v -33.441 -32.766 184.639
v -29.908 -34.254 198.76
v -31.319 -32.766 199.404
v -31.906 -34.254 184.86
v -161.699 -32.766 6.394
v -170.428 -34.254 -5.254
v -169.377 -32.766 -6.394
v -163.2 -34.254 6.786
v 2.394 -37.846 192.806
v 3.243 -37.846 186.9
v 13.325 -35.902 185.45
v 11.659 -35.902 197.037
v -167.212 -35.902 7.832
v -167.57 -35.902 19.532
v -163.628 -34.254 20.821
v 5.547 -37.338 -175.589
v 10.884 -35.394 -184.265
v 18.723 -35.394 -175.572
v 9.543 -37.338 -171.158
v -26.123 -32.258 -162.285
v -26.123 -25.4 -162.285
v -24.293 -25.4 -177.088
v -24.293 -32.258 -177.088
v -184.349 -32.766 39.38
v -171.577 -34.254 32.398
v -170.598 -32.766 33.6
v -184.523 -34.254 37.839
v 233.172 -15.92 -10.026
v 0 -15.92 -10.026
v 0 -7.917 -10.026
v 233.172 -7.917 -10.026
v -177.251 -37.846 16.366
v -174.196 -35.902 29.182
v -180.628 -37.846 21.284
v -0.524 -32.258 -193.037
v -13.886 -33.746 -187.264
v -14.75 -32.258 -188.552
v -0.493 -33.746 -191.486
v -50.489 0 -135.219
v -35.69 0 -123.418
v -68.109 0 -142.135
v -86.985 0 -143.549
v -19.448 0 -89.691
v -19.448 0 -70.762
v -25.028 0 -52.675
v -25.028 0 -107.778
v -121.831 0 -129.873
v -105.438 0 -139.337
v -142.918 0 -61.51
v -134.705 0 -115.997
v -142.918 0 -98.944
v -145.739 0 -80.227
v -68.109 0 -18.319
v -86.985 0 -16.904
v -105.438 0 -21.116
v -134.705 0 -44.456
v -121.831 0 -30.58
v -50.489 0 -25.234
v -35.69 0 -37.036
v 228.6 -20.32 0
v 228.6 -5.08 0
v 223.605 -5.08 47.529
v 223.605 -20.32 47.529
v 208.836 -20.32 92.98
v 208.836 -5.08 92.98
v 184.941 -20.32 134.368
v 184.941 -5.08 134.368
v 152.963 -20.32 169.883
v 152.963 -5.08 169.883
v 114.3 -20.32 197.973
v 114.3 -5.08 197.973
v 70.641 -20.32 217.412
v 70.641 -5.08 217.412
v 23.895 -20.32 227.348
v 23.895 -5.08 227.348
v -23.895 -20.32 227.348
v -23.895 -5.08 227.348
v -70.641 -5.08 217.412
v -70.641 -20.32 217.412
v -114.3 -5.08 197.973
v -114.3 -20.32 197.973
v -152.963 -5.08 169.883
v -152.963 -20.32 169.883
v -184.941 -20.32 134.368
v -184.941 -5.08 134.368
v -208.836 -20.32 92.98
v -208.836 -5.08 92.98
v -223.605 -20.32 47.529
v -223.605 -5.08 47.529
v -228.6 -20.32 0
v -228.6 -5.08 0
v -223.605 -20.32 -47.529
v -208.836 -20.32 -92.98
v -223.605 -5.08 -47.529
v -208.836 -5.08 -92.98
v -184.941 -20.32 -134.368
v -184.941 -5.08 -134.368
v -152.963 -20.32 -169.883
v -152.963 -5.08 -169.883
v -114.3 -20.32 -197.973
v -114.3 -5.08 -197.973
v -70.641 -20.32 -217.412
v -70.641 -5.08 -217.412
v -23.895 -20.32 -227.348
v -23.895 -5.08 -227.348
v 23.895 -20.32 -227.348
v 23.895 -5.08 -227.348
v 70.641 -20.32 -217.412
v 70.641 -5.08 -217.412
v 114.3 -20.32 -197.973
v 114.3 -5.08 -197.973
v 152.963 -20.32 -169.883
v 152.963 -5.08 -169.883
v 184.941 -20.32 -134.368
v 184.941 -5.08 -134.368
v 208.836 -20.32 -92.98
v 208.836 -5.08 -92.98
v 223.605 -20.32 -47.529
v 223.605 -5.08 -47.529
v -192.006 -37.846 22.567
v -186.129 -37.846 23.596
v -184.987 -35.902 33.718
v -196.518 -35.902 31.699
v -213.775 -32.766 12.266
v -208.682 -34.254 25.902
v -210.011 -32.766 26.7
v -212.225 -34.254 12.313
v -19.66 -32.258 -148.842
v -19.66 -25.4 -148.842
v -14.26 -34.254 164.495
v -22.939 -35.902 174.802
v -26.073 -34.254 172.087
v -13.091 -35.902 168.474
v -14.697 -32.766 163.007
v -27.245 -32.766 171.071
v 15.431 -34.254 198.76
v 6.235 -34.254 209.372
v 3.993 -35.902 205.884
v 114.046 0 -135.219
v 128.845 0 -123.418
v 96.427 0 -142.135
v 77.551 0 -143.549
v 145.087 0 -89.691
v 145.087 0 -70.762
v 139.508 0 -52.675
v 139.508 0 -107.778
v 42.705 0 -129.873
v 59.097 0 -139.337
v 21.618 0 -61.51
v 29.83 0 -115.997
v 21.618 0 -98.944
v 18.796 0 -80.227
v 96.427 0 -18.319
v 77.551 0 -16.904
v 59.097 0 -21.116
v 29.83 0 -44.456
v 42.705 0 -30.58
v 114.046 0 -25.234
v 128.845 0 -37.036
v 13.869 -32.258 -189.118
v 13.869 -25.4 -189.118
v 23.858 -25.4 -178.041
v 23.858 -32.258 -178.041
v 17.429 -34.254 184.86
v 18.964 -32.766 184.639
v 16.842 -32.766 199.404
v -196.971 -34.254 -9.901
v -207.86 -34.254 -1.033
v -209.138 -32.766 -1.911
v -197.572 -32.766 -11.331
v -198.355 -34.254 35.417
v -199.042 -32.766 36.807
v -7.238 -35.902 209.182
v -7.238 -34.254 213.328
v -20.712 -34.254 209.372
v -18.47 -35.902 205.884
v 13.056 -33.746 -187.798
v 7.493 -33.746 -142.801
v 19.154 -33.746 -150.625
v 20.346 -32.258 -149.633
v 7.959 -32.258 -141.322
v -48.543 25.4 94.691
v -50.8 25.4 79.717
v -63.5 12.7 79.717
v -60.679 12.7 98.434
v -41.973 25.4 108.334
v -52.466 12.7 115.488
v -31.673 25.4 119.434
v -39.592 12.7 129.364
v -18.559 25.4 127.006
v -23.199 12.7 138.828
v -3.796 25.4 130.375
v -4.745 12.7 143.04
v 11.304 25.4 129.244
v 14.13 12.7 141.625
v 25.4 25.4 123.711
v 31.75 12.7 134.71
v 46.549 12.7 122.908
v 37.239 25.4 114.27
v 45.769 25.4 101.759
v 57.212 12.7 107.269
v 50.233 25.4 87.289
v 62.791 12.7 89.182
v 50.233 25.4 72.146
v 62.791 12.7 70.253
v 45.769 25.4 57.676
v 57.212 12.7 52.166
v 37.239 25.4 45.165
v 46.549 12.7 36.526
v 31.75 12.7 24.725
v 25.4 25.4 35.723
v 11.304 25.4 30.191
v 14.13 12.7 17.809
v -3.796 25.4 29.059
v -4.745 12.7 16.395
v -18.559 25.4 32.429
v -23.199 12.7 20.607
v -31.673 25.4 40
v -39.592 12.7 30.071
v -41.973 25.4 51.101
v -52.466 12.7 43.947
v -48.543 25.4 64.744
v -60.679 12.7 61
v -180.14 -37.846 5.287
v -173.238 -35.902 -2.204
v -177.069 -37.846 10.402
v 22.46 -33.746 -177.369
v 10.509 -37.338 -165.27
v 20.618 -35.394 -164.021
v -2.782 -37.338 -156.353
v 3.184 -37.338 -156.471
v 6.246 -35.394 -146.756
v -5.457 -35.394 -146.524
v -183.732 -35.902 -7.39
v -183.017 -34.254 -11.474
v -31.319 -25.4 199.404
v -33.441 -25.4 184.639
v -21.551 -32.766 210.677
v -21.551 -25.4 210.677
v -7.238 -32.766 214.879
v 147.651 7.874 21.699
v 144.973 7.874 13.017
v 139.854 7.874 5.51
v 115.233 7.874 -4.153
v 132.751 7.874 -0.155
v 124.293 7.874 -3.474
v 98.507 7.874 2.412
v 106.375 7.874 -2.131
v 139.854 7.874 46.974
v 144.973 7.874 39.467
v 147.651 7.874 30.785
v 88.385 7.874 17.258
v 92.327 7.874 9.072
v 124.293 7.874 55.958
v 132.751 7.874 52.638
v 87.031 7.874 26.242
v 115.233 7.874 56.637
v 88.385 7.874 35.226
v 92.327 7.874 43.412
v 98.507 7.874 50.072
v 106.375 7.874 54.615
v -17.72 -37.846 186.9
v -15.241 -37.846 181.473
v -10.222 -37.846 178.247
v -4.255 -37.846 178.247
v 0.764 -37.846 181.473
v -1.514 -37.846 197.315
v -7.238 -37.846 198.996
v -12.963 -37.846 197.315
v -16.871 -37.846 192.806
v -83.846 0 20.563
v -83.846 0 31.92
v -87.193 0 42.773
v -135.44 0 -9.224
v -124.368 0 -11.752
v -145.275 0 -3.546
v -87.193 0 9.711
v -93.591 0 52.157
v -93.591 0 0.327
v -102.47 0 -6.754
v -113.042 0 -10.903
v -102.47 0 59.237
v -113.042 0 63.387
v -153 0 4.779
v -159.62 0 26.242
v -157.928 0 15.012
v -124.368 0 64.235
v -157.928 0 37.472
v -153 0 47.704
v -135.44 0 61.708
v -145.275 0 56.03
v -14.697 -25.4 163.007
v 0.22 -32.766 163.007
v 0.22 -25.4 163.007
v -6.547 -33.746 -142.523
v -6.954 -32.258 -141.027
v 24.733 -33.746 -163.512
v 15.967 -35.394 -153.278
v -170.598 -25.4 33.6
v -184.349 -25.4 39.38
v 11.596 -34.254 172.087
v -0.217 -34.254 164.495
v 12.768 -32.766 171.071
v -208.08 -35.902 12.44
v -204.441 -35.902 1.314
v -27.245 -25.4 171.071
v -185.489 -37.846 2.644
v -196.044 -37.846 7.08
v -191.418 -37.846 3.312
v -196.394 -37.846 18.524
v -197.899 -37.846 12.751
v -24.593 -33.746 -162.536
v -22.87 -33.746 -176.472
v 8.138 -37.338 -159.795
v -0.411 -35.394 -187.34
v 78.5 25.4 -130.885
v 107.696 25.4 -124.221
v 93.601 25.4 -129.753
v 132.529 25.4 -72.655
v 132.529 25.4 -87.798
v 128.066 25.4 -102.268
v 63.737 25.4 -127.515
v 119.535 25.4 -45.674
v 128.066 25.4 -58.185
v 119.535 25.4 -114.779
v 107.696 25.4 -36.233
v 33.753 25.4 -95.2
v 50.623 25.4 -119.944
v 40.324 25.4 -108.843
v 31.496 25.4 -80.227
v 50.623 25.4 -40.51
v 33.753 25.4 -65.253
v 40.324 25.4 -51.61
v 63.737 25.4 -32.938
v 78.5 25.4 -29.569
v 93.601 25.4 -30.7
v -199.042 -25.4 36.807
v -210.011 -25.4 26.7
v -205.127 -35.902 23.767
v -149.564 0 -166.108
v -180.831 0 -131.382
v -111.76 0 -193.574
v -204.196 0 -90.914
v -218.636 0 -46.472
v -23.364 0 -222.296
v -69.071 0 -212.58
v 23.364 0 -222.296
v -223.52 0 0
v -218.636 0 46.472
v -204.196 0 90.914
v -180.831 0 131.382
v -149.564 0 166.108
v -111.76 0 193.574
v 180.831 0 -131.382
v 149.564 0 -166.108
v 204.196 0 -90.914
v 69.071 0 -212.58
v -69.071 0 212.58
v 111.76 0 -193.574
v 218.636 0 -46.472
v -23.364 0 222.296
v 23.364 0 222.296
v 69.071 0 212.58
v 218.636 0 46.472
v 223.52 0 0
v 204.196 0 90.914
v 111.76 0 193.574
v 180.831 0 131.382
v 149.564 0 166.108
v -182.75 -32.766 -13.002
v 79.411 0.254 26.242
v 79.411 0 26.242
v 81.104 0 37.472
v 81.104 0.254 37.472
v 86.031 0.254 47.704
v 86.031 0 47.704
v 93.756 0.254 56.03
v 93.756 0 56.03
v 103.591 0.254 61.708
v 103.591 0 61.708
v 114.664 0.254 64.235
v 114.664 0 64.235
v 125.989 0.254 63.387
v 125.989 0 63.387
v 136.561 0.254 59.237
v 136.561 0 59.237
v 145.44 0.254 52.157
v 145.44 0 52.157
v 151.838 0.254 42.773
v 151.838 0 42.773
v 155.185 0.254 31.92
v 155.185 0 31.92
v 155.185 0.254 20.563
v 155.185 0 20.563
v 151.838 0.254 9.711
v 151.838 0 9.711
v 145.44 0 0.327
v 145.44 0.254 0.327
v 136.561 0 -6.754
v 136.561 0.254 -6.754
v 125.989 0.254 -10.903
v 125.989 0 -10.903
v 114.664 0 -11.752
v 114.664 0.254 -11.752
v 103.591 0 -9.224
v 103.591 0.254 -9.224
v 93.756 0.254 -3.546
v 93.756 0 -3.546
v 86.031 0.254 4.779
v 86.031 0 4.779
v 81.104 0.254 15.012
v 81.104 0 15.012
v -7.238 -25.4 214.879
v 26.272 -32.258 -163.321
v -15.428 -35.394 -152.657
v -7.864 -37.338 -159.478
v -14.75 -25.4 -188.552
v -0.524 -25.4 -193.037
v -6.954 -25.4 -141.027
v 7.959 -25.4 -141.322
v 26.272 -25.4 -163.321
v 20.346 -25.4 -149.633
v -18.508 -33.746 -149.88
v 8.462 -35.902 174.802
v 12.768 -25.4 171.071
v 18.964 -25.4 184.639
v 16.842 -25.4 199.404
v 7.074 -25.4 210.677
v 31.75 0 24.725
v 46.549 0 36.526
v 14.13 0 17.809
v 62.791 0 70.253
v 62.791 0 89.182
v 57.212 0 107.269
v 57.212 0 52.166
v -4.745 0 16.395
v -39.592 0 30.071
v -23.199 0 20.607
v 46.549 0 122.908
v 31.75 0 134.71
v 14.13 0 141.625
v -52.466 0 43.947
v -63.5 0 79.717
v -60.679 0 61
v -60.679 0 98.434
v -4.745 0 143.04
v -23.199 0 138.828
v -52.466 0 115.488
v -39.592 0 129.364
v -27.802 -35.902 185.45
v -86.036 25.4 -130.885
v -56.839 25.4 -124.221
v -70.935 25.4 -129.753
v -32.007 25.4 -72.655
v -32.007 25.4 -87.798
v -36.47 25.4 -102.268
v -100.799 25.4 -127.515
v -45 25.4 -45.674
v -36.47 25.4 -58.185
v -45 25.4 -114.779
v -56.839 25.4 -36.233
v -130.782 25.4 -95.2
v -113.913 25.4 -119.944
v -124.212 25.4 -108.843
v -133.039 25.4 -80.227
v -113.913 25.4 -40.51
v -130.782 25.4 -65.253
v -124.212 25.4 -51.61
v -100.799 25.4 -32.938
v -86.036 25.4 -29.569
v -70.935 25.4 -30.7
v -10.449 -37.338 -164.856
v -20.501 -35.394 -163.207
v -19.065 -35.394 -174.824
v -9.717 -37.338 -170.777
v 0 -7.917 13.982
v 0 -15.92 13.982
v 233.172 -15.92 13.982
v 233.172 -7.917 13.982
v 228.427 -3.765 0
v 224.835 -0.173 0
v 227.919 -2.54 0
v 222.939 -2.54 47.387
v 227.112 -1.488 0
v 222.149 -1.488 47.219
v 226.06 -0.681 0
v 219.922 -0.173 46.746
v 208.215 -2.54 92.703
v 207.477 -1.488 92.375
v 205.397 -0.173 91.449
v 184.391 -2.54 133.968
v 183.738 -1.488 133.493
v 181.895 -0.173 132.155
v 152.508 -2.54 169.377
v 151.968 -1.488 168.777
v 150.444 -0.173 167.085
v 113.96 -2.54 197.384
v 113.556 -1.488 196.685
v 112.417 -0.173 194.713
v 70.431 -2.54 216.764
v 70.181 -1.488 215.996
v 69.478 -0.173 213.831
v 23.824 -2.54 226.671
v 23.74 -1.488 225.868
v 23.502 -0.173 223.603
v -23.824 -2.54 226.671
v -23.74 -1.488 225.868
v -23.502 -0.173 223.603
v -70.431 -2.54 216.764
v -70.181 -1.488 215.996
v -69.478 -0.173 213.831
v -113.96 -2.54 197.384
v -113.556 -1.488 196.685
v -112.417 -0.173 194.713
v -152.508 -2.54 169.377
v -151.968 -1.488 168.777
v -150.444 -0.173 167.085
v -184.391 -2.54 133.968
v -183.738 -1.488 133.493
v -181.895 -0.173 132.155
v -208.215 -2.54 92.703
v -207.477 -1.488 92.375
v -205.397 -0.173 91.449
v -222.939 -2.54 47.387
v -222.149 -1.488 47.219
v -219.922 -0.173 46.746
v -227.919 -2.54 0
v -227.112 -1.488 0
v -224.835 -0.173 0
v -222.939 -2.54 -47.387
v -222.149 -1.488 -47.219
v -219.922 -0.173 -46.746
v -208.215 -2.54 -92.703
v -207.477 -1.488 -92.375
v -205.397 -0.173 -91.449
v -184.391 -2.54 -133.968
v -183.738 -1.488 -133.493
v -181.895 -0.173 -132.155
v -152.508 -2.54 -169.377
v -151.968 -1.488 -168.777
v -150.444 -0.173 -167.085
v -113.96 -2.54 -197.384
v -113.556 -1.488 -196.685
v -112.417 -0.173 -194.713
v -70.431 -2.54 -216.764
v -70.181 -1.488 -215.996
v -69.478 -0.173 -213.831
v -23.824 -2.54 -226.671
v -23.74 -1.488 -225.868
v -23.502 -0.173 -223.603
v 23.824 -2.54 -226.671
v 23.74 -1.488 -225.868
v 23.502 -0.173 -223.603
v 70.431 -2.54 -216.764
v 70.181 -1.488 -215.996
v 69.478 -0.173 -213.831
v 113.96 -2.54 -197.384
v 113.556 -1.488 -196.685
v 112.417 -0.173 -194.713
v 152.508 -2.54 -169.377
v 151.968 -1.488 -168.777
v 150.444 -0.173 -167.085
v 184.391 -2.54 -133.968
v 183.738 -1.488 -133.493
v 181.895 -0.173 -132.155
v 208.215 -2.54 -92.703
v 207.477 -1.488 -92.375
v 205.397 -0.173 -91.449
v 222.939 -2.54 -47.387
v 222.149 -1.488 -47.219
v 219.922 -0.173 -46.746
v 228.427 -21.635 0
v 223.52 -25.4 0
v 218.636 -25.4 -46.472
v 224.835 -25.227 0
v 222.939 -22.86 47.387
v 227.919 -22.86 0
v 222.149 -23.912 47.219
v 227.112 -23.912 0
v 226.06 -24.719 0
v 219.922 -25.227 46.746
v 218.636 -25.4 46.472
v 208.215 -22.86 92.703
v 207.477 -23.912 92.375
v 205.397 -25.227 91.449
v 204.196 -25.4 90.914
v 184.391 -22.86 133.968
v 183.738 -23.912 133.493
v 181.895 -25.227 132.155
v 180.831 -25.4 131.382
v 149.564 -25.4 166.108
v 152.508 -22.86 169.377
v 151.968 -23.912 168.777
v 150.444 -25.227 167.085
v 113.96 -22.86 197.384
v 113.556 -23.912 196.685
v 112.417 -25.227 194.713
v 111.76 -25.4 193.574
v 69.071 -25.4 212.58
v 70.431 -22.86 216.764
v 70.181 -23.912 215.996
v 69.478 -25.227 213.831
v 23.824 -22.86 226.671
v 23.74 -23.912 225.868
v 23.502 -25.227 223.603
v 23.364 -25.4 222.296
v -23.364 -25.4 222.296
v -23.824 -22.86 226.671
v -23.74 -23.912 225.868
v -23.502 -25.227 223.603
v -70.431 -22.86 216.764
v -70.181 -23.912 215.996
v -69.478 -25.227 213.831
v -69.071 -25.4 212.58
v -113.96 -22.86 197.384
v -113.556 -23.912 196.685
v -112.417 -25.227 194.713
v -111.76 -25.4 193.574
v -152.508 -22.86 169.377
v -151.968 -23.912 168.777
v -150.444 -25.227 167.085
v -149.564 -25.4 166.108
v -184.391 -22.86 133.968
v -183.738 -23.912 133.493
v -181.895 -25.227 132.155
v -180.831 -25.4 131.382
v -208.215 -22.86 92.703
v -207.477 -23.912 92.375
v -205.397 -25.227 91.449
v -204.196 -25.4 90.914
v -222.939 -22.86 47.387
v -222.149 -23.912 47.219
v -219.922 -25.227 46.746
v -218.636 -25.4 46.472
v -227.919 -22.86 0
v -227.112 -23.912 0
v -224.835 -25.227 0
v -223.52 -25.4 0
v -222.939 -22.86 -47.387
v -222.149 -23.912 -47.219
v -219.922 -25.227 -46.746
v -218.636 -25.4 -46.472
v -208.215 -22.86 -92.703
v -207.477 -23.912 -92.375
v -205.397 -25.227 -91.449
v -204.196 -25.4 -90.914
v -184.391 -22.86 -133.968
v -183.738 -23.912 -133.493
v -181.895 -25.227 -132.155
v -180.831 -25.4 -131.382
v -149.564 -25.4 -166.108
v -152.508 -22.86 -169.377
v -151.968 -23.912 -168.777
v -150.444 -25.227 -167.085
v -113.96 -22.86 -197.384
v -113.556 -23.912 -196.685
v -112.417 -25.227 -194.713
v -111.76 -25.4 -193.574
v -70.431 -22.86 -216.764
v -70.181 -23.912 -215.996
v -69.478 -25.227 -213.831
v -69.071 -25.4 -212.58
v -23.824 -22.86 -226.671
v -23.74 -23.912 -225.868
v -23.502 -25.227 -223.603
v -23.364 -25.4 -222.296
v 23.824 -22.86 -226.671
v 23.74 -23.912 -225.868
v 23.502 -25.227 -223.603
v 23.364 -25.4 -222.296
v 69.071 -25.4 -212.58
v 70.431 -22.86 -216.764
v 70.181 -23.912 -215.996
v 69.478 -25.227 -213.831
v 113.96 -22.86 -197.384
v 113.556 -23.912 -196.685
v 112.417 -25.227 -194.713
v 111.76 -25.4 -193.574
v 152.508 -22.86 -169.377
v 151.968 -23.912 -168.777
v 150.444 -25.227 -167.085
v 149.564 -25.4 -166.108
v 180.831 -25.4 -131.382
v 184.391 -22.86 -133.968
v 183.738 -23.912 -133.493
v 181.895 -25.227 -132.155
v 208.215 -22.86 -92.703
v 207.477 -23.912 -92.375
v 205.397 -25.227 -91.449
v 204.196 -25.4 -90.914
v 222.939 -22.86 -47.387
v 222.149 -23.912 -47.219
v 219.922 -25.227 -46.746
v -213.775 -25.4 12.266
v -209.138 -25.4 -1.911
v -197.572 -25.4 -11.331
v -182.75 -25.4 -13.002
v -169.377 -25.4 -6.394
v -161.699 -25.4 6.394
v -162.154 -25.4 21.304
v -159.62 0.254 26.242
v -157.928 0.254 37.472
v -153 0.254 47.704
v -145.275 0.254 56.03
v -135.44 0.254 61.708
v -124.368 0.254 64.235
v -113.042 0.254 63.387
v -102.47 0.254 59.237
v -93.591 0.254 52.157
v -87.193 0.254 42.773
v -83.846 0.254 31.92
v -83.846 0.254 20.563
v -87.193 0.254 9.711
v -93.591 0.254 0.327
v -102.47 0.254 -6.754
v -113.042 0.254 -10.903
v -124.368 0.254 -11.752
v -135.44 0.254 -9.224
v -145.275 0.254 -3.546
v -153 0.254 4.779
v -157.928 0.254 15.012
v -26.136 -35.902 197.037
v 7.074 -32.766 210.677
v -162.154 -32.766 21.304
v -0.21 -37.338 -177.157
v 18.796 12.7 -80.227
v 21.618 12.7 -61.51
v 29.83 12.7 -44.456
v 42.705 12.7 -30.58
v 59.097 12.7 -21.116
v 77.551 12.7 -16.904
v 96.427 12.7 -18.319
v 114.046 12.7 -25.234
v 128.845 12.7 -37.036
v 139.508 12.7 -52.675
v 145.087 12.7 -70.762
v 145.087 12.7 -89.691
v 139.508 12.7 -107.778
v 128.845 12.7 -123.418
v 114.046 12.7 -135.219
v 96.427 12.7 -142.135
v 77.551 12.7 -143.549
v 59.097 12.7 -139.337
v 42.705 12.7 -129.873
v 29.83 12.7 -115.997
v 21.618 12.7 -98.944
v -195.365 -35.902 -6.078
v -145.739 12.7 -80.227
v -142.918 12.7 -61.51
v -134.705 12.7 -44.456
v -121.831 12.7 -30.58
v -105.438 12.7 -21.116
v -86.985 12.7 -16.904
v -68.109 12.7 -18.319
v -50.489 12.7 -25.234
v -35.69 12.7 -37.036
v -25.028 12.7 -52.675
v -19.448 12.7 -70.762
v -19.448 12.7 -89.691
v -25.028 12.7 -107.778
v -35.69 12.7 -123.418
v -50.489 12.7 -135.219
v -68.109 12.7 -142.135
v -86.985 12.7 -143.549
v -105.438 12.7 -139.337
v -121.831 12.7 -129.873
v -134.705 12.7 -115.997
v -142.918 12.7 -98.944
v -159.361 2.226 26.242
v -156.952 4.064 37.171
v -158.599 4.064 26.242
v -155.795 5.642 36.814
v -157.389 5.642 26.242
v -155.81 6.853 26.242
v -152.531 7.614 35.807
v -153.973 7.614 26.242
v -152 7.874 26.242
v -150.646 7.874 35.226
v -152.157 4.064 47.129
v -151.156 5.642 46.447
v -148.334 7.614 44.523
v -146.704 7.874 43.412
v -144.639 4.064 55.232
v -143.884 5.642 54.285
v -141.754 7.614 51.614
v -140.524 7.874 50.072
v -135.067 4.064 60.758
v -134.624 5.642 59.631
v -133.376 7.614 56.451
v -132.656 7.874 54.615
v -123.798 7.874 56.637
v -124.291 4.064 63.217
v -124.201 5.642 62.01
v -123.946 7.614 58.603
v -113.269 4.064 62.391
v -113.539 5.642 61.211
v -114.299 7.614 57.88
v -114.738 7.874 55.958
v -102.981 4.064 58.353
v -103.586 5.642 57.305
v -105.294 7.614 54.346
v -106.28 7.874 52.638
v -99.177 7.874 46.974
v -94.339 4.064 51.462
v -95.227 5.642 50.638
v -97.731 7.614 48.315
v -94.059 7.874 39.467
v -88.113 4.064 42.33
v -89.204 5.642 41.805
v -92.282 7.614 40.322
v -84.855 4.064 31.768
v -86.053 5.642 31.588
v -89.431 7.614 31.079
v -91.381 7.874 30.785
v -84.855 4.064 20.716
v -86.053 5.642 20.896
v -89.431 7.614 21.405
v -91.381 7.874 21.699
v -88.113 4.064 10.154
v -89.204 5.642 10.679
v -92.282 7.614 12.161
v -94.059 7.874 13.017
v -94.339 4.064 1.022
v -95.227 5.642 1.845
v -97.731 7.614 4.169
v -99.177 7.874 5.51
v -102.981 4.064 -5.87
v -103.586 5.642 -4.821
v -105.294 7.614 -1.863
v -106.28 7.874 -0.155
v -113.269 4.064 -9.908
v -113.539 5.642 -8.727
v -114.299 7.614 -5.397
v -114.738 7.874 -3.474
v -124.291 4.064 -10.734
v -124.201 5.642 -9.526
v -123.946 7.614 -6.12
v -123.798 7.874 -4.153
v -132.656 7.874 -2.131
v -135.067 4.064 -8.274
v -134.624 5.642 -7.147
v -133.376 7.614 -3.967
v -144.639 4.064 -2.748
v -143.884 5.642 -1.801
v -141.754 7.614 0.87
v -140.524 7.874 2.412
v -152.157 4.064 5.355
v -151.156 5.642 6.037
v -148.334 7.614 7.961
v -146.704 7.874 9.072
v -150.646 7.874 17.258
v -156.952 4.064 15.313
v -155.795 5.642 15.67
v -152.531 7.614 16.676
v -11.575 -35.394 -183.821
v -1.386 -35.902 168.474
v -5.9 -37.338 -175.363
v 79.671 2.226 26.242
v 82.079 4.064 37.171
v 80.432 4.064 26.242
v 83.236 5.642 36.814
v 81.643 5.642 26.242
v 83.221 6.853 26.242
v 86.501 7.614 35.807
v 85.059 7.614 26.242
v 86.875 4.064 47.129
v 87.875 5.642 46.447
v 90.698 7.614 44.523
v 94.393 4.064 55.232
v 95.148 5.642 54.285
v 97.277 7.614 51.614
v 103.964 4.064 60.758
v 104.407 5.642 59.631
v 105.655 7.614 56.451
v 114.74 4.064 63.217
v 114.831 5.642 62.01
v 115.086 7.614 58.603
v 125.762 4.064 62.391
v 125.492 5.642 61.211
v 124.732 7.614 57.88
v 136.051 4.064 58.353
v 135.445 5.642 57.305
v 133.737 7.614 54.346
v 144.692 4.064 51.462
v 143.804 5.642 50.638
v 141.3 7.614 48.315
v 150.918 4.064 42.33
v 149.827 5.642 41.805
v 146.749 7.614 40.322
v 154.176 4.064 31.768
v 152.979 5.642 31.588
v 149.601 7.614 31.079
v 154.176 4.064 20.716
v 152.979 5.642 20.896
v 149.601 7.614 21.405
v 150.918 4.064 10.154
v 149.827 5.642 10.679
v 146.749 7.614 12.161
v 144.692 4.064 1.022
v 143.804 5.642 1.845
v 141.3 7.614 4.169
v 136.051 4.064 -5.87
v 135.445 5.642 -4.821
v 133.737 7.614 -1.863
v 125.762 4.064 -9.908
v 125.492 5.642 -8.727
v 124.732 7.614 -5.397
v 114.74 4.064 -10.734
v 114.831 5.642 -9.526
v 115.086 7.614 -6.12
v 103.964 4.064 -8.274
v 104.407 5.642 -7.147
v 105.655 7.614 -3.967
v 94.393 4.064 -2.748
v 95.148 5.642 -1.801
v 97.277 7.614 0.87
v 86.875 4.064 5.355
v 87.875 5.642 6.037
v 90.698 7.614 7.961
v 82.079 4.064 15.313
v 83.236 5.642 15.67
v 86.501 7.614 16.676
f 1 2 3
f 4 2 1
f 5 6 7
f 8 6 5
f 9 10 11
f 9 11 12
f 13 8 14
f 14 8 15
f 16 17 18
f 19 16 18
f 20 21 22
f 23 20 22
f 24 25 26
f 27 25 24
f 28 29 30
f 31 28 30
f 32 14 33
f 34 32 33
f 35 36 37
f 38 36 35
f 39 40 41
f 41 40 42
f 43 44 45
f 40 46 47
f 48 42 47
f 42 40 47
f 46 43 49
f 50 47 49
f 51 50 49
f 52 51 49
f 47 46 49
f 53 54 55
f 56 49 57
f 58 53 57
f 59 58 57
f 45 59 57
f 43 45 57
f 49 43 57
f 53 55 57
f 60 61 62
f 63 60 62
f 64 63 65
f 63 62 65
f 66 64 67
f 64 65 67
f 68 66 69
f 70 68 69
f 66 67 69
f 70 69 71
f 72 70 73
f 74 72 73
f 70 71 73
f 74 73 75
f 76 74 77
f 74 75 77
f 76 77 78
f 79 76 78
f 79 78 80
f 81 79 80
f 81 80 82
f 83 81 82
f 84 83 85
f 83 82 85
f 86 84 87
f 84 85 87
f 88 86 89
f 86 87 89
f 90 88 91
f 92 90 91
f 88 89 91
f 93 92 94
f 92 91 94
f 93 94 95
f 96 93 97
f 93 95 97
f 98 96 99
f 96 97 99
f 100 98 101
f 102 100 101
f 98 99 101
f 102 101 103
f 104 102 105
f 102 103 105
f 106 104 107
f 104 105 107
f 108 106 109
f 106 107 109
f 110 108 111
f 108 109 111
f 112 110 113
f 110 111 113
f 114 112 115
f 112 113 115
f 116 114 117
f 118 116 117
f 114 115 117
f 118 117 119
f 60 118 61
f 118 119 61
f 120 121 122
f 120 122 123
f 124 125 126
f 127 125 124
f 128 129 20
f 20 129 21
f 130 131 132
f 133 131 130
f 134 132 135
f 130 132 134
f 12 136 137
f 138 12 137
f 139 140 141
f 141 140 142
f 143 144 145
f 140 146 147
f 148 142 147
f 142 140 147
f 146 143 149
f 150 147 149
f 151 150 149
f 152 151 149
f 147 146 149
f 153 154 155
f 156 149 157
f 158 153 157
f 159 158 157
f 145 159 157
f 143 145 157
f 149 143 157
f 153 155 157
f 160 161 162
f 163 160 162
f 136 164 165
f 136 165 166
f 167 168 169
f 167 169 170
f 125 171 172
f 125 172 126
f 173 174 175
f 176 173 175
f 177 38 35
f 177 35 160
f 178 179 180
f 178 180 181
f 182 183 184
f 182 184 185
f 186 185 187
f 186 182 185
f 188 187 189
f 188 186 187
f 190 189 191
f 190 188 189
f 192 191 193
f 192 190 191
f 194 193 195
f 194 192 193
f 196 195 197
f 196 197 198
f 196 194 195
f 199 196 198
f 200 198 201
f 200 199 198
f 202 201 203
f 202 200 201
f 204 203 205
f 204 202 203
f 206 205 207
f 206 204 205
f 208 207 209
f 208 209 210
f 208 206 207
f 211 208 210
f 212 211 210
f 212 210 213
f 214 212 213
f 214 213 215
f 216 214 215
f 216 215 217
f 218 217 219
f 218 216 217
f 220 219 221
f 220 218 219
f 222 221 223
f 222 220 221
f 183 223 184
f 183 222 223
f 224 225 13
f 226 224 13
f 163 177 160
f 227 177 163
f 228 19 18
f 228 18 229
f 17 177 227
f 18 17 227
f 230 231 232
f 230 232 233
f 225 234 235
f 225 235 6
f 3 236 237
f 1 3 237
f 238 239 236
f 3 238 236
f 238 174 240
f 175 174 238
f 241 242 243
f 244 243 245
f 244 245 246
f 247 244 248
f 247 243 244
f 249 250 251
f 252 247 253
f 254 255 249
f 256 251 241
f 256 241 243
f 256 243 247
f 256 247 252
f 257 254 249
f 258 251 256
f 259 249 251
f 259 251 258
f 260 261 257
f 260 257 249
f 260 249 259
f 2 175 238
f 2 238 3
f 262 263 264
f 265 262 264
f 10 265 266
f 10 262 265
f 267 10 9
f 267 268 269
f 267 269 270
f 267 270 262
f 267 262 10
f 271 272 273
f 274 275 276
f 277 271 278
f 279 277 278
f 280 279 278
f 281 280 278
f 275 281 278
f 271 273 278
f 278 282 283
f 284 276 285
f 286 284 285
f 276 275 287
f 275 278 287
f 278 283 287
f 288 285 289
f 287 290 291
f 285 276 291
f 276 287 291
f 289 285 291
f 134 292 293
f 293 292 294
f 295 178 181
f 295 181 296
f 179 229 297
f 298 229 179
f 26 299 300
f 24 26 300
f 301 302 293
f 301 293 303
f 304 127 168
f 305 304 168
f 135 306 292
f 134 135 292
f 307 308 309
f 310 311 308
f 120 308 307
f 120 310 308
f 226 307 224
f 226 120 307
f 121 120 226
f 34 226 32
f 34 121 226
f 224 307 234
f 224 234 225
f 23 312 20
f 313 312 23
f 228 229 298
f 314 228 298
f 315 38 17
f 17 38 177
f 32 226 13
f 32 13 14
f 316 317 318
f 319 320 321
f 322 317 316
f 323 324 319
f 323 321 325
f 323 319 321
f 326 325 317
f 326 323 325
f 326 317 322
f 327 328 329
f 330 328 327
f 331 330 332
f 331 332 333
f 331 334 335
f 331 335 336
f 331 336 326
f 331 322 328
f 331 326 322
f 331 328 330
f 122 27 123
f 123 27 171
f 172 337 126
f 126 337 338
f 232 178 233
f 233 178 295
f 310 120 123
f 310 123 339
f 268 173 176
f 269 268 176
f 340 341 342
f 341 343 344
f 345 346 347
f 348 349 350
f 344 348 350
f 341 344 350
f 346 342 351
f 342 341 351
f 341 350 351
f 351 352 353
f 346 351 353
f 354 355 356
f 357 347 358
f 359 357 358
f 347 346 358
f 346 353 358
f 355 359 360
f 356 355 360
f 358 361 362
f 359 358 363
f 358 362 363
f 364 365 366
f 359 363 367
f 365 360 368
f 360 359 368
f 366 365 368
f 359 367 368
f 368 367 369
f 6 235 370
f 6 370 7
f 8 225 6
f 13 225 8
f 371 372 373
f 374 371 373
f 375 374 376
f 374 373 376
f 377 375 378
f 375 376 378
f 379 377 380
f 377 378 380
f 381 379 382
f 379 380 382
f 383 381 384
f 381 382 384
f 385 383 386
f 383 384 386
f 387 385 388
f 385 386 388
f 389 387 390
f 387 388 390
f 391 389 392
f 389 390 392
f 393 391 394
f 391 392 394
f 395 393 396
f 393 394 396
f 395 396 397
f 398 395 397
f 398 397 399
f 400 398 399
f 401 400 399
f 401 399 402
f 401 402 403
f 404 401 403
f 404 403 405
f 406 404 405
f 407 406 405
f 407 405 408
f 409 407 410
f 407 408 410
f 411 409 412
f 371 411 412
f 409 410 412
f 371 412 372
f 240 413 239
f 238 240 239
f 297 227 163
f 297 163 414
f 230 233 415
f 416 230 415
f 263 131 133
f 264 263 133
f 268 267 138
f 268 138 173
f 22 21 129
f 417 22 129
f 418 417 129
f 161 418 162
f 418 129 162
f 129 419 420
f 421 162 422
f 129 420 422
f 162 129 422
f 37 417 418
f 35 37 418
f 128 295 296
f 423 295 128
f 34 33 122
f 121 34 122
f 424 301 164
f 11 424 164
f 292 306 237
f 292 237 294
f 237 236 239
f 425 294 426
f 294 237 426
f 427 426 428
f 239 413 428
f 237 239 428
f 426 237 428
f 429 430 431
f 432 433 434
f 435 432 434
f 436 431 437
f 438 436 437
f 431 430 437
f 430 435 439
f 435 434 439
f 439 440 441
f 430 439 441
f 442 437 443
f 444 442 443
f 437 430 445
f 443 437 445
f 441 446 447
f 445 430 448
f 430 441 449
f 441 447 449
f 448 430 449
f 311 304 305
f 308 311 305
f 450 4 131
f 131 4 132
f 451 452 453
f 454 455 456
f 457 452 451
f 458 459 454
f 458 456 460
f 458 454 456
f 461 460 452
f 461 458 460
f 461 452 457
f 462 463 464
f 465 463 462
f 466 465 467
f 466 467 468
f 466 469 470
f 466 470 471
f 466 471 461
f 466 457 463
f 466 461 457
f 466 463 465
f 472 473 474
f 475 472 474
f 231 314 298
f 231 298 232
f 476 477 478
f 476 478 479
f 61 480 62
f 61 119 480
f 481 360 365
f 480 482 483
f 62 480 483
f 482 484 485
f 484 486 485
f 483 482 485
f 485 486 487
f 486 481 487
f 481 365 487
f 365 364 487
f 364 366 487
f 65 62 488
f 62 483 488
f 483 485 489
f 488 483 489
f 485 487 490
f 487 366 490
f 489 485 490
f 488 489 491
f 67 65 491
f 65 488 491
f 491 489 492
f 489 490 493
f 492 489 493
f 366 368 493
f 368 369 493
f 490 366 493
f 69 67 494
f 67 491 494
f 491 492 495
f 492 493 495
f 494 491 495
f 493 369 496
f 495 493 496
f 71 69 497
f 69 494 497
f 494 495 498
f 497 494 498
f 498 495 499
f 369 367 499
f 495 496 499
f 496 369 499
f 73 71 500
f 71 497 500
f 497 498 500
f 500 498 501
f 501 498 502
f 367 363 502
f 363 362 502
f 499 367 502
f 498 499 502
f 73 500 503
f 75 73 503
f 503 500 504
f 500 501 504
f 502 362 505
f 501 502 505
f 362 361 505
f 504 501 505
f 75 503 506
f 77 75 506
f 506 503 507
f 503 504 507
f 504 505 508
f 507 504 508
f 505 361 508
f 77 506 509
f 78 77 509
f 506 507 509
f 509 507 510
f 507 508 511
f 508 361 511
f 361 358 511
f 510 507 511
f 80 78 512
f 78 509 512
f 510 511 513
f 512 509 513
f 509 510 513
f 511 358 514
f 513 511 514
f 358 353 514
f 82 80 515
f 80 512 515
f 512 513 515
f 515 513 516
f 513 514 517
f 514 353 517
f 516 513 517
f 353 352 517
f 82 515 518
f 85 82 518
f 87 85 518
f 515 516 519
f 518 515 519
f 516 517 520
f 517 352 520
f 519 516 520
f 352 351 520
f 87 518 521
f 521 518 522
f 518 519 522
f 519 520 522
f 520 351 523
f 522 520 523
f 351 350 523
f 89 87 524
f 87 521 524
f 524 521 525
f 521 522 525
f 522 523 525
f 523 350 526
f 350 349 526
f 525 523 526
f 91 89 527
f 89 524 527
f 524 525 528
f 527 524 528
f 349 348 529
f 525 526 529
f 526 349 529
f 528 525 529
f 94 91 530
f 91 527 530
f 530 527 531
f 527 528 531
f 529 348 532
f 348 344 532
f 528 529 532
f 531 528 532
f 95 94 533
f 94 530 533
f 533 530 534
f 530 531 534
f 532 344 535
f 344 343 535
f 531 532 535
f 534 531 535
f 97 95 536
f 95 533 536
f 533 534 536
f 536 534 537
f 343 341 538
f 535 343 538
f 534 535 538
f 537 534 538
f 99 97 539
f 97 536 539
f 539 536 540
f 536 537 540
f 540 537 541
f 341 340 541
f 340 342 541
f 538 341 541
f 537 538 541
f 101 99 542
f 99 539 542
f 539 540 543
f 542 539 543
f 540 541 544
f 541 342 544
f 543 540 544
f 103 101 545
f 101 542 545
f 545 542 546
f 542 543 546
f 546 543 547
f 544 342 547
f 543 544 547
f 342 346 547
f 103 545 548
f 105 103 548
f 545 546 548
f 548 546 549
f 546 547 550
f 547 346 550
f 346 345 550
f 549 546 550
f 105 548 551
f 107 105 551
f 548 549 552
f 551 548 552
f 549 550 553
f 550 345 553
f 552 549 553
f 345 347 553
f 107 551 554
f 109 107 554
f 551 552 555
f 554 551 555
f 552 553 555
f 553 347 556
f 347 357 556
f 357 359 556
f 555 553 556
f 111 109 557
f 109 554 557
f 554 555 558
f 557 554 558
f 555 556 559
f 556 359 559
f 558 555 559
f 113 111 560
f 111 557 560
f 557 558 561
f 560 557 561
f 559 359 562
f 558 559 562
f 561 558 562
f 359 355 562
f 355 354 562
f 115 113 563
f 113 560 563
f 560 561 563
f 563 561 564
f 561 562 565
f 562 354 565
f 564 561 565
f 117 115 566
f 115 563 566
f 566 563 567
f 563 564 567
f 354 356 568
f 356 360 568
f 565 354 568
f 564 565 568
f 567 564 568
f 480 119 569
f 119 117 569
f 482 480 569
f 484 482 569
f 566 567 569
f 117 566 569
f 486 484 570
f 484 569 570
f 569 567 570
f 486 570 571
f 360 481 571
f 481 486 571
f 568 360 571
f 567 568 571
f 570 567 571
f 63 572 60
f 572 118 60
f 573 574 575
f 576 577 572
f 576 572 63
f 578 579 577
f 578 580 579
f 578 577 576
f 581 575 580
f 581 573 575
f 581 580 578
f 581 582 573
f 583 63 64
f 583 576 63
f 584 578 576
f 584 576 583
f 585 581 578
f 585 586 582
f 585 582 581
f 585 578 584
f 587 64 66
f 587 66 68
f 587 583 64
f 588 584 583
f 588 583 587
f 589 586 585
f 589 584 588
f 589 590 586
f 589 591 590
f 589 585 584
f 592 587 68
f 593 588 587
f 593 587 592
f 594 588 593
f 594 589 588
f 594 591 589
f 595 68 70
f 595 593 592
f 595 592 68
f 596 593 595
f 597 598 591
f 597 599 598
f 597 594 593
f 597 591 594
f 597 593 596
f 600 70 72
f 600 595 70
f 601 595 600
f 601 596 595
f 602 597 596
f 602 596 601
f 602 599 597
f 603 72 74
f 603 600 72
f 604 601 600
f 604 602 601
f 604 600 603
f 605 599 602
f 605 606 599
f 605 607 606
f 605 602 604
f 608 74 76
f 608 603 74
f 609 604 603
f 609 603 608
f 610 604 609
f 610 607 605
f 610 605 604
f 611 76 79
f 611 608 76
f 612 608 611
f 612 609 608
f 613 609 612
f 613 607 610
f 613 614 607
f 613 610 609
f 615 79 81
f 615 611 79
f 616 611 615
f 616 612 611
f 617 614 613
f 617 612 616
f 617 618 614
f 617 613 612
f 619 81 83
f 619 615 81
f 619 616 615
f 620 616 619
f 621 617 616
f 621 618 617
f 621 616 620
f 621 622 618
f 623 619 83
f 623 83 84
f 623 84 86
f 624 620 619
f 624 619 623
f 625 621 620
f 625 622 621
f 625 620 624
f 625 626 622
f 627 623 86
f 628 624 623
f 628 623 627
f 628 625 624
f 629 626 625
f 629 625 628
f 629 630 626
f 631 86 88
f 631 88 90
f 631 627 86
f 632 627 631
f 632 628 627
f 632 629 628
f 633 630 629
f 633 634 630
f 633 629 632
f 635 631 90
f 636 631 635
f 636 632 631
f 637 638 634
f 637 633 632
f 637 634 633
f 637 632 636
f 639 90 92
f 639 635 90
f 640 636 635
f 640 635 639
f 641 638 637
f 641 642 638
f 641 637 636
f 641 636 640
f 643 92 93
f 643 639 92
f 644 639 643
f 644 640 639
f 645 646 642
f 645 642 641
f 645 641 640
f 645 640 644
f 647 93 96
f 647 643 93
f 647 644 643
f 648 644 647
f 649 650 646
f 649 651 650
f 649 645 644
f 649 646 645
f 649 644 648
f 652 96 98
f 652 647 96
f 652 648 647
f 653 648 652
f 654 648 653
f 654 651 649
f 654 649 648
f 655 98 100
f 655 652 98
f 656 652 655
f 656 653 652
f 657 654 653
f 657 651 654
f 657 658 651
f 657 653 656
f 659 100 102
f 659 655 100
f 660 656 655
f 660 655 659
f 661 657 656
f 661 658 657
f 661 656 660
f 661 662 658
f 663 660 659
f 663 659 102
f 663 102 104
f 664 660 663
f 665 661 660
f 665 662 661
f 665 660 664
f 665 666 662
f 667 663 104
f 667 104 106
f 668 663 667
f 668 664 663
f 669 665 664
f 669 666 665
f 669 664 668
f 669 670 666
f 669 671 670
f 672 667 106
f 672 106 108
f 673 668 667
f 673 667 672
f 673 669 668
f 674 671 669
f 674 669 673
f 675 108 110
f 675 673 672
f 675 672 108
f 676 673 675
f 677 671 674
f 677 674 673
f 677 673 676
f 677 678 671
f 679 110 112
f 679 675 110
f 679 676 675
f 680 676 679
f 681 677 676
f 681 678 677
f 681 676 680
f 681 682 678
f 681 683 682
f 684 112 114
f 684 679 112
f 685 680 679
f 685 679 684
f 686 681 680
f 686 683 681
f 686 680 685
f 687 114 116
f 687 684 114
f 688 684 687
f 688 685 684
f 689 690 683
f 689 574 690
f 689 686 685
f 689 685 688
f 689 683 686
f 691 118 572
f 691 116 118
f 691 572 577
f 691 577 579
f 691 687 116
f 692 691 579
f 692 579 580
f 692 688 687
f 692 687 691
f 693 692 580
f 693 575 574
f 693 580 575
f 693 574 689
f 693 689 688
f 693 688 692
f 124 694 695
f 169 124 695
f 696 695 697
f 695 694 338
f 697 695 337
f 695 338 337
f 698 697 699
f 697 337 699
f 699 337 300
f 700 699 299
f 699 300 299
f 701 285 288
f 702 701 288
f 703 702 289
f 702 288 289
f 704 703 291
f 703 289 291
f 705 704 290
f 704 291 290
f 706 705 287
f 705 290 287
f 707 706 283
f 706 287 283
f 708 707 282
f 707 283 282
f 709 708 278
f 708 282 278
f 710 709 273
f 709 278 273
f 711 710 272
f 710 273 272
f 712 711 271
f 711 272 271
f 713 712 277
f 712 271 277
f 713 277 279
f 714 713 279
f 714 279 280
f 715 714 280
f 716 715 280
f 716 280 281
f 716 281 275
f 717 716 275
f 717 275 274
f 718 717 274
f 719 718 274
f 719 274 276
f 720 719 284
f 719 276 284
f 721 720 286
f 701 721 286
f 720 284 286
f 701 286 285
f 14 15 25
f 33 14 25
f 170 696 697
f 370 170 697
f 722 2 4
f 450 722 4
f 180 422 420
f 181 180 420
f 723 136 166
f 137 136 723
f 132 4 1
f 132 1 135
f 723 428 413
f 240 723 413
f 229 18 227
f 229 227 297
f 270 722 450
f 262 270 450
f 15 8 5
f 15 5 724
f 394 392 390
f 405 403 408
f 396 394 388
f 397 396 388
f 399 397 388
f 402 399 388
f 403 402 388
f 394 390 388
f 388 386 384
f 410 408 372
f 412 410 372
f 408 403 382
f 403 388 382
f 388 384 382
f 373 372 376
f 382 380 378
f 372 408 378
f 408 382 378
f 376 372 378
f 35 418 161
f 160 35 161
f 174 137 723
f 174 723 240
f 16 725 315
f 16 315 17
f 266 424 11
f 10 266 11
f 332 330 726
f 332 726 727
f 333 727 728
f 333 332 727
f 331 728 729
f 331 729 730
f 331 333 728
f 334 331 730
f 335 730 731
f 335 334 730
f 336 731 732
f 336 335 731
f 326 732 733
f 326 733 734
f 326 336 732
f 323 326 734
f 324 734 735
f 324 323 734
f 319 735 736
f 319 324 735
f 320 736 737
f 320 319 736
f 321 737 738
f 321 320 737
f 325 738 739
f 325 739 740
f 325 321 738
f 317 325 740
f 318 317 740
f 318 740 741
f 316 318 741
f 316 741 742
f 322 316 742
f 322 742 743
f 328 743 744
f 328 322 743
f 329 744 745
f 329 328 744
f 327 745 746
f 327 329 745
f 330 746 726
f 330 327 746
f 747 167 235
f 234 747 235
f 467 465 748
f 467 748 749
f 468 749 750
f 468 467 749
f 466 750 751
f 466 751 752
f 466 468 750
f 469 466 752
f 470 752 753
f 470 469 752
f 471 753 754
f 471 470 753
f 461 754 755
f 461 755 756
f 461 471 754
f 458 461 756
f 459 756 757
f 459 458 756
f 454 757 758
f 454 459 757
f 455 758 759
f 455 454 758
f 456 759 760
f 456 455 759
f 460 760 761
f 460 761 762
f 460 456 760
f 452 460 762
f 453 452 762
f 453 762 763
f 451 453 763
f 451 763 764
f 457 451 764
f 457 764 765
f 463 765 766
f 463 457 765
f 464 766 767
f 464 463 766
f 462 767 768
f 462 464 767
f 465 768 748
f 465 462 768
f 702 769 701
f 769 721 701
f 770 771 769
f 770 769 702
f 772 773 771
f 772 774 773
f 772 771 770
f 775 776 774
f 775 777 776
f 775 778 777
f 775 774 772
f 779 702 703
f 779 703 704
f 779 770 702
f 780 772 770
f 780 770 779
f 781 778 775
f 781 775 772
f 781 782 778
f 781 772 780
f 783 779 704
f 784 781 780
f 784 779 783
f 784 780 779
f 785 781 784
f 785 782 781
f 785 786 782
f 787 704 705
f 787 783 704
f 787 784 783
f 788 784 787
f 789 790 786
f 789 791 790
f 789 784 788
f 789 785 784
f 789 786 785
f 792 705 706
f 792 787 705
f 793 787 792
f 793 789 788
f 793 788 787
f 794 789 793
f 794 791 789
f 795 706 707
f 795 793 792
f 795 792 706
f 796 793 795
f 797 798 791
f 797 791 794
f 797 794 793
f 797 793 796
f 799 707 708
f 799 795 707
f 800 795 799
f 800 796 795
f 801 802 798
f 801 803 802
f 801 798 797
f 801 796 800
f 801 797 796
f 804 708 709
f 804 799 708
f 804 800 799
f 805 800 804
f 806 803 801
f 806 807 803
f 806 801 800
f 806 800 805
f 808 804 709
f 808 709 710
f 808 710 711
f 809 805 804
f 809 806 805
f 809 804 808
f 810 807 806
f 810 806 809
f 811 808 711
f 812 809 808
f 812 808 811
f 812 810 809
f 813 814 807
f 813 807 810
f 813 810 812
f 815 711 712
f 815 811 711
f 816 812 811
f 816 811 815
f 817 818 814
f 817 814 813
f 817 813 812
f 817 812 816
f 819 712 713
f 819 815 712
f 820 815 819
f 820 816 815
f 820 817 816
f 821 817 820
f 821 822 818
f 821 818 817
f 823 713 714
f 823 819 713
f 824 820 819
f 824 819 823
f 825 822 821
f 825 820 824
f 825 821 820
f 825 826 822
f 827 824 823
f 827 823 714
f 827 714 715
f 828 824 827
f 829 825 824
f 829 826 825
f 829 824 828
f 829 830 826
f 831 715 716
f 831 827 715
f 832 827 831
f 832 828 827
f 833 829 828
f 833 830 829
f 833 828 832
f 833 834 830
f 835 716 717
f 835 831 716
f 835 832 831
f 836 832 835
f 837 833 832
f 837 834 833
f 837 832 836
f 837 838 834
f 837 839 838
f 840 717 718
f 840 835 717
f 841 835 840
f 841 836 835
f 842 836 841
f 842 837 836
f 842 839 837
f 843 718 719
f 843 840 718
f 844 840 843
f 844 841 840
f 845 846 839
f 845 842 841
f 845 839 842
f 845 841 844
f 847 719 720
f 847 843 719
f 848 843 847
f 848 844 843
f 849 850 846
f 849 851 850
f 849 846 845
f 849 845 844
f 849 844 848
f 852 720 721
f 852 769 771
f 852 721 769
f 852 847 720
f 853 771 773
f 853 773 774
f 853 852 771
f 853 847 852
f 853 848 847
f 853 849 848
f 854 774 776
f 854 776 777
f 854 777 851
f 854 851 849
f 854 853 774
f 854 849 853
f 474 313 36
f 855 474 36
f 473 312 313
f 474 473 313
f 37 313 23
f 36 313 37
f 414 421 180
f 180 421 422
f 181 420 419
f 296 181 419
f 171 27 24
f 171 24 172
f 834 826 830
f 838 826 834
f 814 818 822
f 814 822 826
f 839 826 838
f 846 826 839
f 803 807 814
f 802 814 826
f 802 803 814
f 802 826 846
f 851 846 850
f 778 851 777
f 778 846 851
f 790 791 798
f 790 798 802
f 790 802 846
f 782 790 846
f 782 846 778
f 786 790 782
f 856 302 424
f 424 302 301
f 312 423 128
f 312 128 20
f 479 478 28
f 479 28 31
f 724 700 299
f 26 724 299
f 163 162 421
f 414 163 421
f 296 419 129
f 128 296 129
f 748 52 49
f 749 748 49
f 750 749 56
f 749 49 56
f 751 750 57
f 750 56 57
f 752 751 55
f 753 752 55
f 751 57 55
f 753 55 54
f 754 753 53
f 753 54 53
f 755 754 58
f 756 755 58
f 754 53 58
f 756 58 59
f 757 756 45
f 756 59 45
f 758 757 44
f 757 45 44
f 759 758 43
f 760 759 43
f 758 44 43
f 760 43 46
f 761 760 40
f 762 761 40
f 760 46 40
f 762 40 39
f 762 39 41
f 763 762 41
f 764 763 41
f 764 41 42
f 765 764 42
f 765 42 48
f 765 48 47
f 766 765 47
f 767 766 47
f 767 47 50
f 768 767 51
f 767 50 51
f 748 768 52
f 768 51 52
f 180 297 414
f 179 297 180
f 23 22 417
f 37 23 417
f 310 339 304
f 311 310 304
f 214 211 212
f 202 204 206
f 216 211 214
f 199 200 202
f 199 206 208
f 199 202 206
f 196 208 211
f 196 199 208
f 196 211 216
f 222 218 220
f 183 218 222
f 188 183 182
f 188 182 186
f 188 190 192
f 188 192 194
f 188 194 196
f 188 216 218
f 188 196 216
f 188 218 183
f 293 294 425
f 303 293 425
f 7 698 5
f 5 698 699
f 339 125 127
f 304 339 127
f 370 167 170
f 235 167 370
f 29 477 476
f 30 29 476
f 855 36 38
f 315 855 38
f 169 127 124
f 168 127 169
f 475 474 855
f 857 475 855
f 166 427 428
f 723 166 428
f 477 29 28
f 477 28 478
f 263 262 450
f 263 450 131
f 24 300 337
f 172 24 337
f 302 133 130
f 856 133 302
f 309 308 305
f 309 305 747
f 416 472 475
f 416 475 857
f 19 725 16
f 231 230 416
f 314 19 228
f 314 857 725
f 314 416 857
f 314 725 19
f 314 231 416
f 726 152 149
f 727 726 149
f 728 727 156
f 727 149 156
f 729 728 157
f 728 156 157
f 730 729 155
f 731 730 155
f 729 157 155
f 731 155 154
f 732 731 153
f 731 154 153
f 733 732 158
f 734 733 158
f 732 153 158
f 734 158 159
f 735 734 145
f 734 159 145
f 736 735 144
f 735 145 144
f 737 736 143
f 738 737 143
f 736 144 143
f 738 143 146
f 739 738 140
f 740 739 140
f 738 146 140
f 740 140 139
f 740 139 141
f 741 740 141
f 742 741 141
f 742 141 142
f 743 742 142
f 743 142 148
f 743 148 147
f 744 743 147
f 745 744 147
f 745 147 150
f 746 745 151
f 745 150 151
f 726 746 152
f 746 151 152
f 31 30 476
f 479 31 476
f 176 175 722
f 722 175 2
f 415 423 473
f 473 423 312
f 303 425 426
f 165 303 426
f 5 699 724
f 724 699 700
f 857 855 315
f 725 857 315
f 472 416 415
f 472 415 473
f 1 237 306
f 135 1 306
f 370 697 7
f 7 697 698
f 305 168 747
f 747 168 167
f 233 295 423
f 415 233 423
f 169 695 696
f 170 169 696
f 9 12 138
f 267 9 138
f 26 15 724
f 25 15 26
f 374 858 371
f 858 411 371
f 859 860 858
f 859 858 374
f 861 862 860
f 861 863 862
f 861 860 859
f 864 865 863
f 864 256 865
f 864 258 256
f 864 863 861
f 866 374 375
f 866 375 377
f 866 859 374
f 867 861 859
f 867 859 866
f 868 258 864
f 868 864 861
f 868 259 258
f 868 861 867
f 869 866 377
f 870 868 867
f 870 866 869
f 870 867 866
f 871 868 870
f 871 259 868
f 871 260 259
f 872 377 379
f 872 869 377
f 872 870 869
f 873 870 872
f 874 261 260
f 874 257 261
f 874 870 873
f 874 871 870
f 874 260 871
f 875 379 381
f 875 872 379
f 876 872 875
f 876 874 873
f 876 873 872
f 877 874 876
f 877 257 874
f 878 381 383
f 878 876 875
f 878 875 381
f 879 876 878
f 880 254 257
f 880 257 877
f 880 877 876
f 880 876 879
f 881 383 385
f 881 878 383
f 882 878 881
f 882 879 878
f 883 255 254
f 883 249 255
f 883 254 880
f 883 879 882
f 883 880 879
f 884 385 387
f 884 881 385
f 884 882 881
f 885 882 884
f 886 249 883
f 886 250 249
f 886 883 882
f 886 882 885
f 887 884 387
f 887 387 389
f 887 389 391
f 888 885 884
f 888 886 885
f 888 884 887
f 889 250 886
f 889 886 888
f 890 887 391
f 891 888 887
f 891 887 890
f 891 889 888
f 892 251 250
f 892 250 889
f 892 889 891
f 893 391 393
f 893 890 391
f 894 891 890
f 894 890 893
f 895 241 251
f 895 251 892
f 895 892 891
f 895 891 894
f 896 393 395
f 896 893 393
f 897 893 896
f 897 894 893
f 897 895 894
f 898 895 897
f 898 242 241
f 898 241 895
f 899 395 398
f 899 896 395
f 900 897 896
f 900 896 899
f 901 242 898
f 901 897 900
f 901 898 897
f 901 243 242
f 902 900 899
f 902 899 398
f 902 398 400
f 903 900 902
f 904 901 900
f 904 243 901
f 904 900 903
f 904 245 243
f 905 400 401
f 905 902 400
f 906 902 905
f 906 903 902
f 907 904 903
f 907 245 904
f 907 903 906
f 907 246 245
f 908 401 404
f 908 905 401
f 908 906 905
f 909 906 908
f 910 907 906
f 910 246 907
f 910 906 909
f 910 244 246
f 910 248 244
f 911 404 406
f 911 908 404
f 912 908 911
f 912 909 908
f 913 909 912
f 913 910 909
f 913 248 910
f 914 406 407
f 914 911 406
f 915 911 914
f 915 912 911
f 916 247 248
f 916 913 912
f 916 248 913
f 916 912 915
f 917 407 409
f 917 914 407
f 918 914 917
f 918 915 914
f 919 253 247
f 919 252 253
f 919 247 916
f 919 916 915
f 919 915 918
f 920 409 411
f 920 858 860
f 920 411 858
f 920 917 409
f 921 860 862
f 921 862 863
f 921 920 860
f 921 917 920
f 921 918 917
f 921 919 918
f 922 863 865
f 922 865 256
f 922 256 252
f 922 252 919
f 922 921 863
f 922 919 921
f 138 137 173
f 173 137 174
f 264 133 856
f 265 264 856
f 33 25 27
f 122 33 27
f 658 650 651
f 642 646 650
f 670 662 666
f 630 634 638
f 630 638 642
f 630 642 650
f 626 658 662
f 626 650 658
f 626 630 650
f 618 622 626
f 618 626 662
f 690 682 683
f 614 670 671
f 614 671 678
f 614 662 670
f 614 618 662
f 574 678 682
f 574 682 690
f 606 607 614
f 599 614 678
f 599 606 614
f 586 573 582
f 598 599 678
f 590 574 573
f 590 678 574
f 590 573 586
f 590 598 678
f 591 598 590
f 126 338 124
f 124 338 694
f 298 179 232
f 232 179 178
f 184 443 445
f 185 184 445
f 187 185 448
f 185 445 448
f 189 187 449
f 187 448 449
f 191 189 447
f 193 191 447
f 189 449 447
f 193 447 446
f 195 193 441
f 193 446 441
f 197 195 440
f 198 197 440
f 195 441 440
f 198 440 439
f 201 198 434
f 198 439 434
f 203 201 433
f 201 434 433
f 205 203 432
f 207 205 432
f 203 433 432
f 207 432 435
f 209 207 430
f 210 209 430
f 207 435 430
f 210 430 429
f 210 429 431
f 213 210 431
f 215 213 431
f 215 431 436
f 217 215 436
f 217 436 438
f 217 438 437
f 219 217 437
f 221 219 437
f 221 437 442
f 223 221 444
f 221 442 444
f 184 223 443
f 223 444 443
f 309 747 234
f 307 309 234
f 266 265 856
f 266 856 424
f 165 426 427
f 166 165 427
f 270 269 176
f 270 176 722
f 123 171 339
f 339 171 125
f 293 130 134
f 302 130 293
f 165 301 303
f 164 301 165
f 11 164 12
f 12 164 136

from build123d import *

# Parameters (mm, degrees)
F0_R      = 228.6
F1_DEPTH  = 25.4
F2_R      = 5.08
F3_R      = 63.5
F4_DEPTH  = 25.4
F5_W      = 8.002596
F5_H      = 24.007802
F6_DEPTH  = 233.172
F7_R      = 38.1
F8_DEPTH  = 7.874
F9_SIZE   = 12.7
F11_DEPTH = 12.446
F12_SIZE  = 5.08
F13_SIZE  = 5.08
F14_SIZE  = 5.08
F16_DEPTH = 12.446
F17_SIZE  = 5.08
F18_SIZE  = 5.08
F19_SIZE  = 5.08
F20_R     = 7.62
F22_DEPTH = 11.938
F23_SIZE  = 5.08
F24_SIZE  = 5.08
F25_SIZE  = 5.08


with BuildPart() as f1:
    # F0 (on Front) → F1 (new body)
    with BuildSketch(Plane.XZ):
        Circle(F0_R)
    extrude(amount=F1_DEPTH)

    # F2
    f2_edges = [f1.edges().sort_by_distance(p)[0] for p in [
        (-228.6, 0, 0),
        (-228.6, -25.4, 0),
    ]]
    fillet(f2_edges, radius=F2_R)


with BuildPart() as f4:
    # F3 (on face) → F4 (new body)
    with BuildSketch(Plane(origin=(0, 0, 0), x_dir=(-1, 0, 0), z_dir=(0, 1, 0))):
        with Locations((82.239256, -80.226615)):
            Circle(F3_R)
        with Locations((-82.296442, -80.226615)):
            Circle(F3_R)
        with Locations((0, 79.717383)):
            Circle(F3_R)
    extrude(amount=F4_DEPTH)

    # F9
    f9_edges = [f4.edges().sort_by_distance(p)[0] for p in [
        (63.5, 25.4, 79.717383),
        (145.796442, 25.4, -80.226615),
        (-18.739256, 25.4, -80.226615),
    ]]
    chamfer(f9_edges, length=F9_SIZE)


with BuildPart() as f6:
    # F5 (on Right) → F6 (new body)
    with BuildSketch(Plane.YZ):
        with Locations((-11.918711, 1.977991)):
            Rectangle(F5_W, F5_H)
    extrude(amount=F6_DEPTH)


with BuildPart() as f8:
    # F7 (on face) → F8 (new body)
    with BuildSketch(Plane(origin=(0, 0, 0), x_dir=(-1, 0, 0), z_dir=(0, 1, 0))):
        with Locations((121.520357, 26.241926)):
            Circle(F7_R)
        with Locations((-117.51097, 26.241926)):
            Circle(F7_R)
    extrude(amount=F8_DEPTH)

    # F20
    f20_edges = [f8.edges().sort_by_distance(p)[0] for p in [
        (-83.420357, 7.874, 26.241926),
        (155.61097, 7.874, 26.241926),
    ]]
    fillet(f20_edges, radius=F20_R)


with BuildPart() as f11:
    # F10 (on face) → F11 (new body)
    with BuildSketch(Plane.XZ.offset(25.4)):
        Polygon((-169.377034, -6.394274), (-161.69935, 6.394274), (-162.154481, 21.303555), (-170.597928, 33.599977), (-184.348956, 39.379513), (-199.041709, 36.807202), (-210.011344, 26.699734), (-213.775078, 12.266158), (-209.137952, -1.910966), (-197.572222, -11.330503), (-182.749924, -13.001815), align=None)
    extrude(amount=F11_DEPTH)

    # F12
    f12_edges = [f11.edges().sort_by_distance(p)[0] for p in [
        (-176.063479, -37.846, -9.698045),
        (-165.538192, -37.846, 0),
        (-161.926916, -37.846, 13.848914),
        (-166.376205, -37.846, 27.451766),
        (-177.473442, -37.846, 36.489745),
        (-191.695333, -37.846, 38.093358),
        (-204.526527, -37.846, 31.753468),
        (-211.893211, -37.846, 19.482946),
        (-211.456515, -37.846, 5.177596),
        (-203.355087, -37.846, -6.620735),
        (-190.161073, -37.846, -12.166159),
    ]]
    chamfer(f12_edges, length=F12_SIZE)

    # F13
    f13_edges = [f11.edges().sort_by_distance(p)[0] for p in [
        (-178.313801, -37.846, -5.143657),
        (-189.591876, -37.846, -7.118148),
        (-169.893571, -37.846, 2.614779),
        (-200.147087, -37.846, -2.681808),
        (-167.00455, -37.846, 13.693911),
        (-206.62823, -37.846, 6.756856),
        (-170.563982, -37.846, 24.576192),
        (-206.977586, -37.846, 18.201136),
        (-179.441771, -37.846, 31.806575),
        (-201.084239, -37.846, 28.017553),
        (-190.819284, -37.846, 33.089465),
    ]]
    chamfer(f13_edges, length=F13_SIZE)

    # F14
    f14_edges = [f11.edges().sort_by_distance(p)[0] for p in [
        (-180.564123, -37.846, -0.589268),
        (-189.022679, -37.846, -2.070137),
        (-174.248951, -37.846, 5.229558),
        (-196.939088, -37.846, 1.257118),
        (-172.082185, -37.846, 13.538907),
        (-201.799945, -37.846, 8.336116),
        (-174.751759, -37.846, 21.700618),
        (-202.061962, -37.846, 16.919326),
        (-181.410101, -37.846, 27.123405),
        (-197.641952, -37.846, 24.281639),
        (-189.943235, -37.846, 28.085573),
    ]]
    chamfer(f14_edges, length=F14_SIZE)


with BuildPart() as f16:
    # F15 (on face) → F16 (new body)
    with BuildSketch(Plane.XZ.offset(25.4)):
        Polygon((-14.696602, 163.006811), (0.219624, 163.006811), (12.767952, 171.071131), (18.964376, 184.639408), (16.841576, 199.403808), (7.073525, 210.676739), (-7.238489, 214.879126), (-21.550503, 210.676739), (-31.318553, 199.403808), (-33.441353, 184.639408), (-27.244929, 171.071131), align=None)
    extrude(amount=F16_DEPTH)

    # F17
    f17_edges = [f16.edges().sort_by_distance(p)[0] for p in [
        (-7.238489, -37.846, 163.006811),
        (6.493788, -37.846, 167.038971),
        (15.866164, -37.846, 177.85527),
        (17.902976, -37.846, 192.021608),
        (11.957551, -37.846, 205.040274),
        (-0.082482, -37.846, 212.777932),
        (-14.394496, -37.846, 212.777932),
        (-26.434528, -37.846, 205.040274),
        (-32.379953, -37.846, 192.021608),
        (-30.343141, -37.846, 177.85527),
        (-20.970765, -37.846, 167.038971),
    ]]
    chamfer(f17_edges, length=F17_SIZE)

    # F18
    f18_edges = [f16.edges().sort_by_distance(p)[0] for p in [
        (-7.238489, -37.846, 168.086811),
        (-18.22431, -37.846, 171.312539),
        (3.747333, -37.846, 171.312539),
        (-25.722211, -37.846, 179.965578),
        (11.245234, -37.846, 179.965578),
        (-27.35166, -37.846, 191.298648),
        (12.874683, -37.846, 191.298648),
        (-22.59532, -37.846, 201.713581),
        (8.118343, -37.846, 201.713581),
        (-12.963294, -37.846, 207.903708),
        (-1.513683, -37.846, 207.903708),
    ]]
    chamfer(f18_edges, length=F18_SIZE)

    # F19
    f19_edges = [f16.edges().sort_by_distance(p)[0] for p in [
        (-7.238489, -37.846, 173.166811),
        (-15.477855, -37.846, 175.586107),
        (1.000877, -37.846, 175.586107),
        (-21.10128, -37.846, 182.075886),
        (6.624303, -37.846, 182.075886),
        (-22.323367, -37.846, 190.575689),
        (7.84639, -37.846, 190.575689),
        (-18.756112, -37.846, 198.386889),
        (4.279135, -37.846, 198.386889),
        (-11.532093, -37.846, 203.029484),
        (-2.944884, -37.846, 203.029484),
    ]]
    chamfer(f19_edges, length=F19_SIZE)


with BuildPart() as f22:
    # F21 (on face) → F22 (new body)
    with BuildSketch(Plane.XZ.offset(25.4)):
        Polygon((26.272274, -163.321405), (20.345511, -149.633189), (7.959192, -141.322178), (-6.954114, -141.02706), (-19.659538, -148.841534), (-26.123198, -162.284558), (-24.292927, -177.088067), (-14.749823, -188.552053), (-0.523755, -193.03678), (13.868602, -189.11838), (23.857775, -178.040916), align=None)
    extrude(amount=F22_DEPTH)

    # F23
    f23_edges = [f22.edges().sort_by_distance(p)[0] for p in [
        (18.863189, -37.338, -183.579648),
        (25.065025, -37.338, -170.68116),
        (23.308892, -37.338, -156.477297),
        (14.152352, -37.338, -145.477683),
        (0.502539, -37.338, -141.174619),
        (-13.306826, -37.338, -144.934297),
        (-22.891368, -37.338, -155.563046),
        (-25.208062, -37.338, -169.686313),
        (-19.521375, -37.338, -182.82006),
        (-7.636789, -37.338, -190.794417),
        (6.672423, -37.338, -191.07758),
    ]]
    chamfer(f23_edges, length=F23_SIZE)

    # F24
    f24_edges = [f22.edges().sort_by_distance(p)[0] for p in [
        (15.090551, -37.338, -180.177648),
        (5.337939, -37.338, -186.175993),
        (20.05202, -37.338, -169.858858),
        (-6.109431, -37.338, -185.949463),
        (18.647114, -37.338, -158.495767),
        (-15.6171, -37.338, -179.569978),
        (11.321881, -37.338, -149.696076),
        (-20.16645, -37.338, -169.062979),
        (0.402031, -37.338, -146.253625),
        (-18.313094, -37.338, -157.764366),
        (-10.645461, -37.338, -149.261367),
    ]]
    chamfer(f24_edges, length=F24_SIZE)

    # F25
    f25_edges = [f22.edges().sort_by_distance(p)[0] for p in [
        (11.317913, -37.338, -176.775647),
        (4.003454, -37.338, -181.274407),
        (15.039015, -37.338, -169.036555),
        (-4.582073, -37.338, -181.104509),
        (13.985335, -37.338, -160.514237),
        (-11.712825, -37.338, -176.319895),
        (8.491411, -37.338, -153.914469),
        (-15.124837, -37.338, -168.439646),
        (0.301523, -37.338, -151.33263),
        (-13.734821, -37.338, -159.965686),
        (-7.984096, -37.338, -153.588437),
    ]]
    chamfer(f25_edges, length=F25_SIZE)


solid = Compound([f1.part, f4.part, f6.part, f8.part, f11.part, f16.part, f22.part])
